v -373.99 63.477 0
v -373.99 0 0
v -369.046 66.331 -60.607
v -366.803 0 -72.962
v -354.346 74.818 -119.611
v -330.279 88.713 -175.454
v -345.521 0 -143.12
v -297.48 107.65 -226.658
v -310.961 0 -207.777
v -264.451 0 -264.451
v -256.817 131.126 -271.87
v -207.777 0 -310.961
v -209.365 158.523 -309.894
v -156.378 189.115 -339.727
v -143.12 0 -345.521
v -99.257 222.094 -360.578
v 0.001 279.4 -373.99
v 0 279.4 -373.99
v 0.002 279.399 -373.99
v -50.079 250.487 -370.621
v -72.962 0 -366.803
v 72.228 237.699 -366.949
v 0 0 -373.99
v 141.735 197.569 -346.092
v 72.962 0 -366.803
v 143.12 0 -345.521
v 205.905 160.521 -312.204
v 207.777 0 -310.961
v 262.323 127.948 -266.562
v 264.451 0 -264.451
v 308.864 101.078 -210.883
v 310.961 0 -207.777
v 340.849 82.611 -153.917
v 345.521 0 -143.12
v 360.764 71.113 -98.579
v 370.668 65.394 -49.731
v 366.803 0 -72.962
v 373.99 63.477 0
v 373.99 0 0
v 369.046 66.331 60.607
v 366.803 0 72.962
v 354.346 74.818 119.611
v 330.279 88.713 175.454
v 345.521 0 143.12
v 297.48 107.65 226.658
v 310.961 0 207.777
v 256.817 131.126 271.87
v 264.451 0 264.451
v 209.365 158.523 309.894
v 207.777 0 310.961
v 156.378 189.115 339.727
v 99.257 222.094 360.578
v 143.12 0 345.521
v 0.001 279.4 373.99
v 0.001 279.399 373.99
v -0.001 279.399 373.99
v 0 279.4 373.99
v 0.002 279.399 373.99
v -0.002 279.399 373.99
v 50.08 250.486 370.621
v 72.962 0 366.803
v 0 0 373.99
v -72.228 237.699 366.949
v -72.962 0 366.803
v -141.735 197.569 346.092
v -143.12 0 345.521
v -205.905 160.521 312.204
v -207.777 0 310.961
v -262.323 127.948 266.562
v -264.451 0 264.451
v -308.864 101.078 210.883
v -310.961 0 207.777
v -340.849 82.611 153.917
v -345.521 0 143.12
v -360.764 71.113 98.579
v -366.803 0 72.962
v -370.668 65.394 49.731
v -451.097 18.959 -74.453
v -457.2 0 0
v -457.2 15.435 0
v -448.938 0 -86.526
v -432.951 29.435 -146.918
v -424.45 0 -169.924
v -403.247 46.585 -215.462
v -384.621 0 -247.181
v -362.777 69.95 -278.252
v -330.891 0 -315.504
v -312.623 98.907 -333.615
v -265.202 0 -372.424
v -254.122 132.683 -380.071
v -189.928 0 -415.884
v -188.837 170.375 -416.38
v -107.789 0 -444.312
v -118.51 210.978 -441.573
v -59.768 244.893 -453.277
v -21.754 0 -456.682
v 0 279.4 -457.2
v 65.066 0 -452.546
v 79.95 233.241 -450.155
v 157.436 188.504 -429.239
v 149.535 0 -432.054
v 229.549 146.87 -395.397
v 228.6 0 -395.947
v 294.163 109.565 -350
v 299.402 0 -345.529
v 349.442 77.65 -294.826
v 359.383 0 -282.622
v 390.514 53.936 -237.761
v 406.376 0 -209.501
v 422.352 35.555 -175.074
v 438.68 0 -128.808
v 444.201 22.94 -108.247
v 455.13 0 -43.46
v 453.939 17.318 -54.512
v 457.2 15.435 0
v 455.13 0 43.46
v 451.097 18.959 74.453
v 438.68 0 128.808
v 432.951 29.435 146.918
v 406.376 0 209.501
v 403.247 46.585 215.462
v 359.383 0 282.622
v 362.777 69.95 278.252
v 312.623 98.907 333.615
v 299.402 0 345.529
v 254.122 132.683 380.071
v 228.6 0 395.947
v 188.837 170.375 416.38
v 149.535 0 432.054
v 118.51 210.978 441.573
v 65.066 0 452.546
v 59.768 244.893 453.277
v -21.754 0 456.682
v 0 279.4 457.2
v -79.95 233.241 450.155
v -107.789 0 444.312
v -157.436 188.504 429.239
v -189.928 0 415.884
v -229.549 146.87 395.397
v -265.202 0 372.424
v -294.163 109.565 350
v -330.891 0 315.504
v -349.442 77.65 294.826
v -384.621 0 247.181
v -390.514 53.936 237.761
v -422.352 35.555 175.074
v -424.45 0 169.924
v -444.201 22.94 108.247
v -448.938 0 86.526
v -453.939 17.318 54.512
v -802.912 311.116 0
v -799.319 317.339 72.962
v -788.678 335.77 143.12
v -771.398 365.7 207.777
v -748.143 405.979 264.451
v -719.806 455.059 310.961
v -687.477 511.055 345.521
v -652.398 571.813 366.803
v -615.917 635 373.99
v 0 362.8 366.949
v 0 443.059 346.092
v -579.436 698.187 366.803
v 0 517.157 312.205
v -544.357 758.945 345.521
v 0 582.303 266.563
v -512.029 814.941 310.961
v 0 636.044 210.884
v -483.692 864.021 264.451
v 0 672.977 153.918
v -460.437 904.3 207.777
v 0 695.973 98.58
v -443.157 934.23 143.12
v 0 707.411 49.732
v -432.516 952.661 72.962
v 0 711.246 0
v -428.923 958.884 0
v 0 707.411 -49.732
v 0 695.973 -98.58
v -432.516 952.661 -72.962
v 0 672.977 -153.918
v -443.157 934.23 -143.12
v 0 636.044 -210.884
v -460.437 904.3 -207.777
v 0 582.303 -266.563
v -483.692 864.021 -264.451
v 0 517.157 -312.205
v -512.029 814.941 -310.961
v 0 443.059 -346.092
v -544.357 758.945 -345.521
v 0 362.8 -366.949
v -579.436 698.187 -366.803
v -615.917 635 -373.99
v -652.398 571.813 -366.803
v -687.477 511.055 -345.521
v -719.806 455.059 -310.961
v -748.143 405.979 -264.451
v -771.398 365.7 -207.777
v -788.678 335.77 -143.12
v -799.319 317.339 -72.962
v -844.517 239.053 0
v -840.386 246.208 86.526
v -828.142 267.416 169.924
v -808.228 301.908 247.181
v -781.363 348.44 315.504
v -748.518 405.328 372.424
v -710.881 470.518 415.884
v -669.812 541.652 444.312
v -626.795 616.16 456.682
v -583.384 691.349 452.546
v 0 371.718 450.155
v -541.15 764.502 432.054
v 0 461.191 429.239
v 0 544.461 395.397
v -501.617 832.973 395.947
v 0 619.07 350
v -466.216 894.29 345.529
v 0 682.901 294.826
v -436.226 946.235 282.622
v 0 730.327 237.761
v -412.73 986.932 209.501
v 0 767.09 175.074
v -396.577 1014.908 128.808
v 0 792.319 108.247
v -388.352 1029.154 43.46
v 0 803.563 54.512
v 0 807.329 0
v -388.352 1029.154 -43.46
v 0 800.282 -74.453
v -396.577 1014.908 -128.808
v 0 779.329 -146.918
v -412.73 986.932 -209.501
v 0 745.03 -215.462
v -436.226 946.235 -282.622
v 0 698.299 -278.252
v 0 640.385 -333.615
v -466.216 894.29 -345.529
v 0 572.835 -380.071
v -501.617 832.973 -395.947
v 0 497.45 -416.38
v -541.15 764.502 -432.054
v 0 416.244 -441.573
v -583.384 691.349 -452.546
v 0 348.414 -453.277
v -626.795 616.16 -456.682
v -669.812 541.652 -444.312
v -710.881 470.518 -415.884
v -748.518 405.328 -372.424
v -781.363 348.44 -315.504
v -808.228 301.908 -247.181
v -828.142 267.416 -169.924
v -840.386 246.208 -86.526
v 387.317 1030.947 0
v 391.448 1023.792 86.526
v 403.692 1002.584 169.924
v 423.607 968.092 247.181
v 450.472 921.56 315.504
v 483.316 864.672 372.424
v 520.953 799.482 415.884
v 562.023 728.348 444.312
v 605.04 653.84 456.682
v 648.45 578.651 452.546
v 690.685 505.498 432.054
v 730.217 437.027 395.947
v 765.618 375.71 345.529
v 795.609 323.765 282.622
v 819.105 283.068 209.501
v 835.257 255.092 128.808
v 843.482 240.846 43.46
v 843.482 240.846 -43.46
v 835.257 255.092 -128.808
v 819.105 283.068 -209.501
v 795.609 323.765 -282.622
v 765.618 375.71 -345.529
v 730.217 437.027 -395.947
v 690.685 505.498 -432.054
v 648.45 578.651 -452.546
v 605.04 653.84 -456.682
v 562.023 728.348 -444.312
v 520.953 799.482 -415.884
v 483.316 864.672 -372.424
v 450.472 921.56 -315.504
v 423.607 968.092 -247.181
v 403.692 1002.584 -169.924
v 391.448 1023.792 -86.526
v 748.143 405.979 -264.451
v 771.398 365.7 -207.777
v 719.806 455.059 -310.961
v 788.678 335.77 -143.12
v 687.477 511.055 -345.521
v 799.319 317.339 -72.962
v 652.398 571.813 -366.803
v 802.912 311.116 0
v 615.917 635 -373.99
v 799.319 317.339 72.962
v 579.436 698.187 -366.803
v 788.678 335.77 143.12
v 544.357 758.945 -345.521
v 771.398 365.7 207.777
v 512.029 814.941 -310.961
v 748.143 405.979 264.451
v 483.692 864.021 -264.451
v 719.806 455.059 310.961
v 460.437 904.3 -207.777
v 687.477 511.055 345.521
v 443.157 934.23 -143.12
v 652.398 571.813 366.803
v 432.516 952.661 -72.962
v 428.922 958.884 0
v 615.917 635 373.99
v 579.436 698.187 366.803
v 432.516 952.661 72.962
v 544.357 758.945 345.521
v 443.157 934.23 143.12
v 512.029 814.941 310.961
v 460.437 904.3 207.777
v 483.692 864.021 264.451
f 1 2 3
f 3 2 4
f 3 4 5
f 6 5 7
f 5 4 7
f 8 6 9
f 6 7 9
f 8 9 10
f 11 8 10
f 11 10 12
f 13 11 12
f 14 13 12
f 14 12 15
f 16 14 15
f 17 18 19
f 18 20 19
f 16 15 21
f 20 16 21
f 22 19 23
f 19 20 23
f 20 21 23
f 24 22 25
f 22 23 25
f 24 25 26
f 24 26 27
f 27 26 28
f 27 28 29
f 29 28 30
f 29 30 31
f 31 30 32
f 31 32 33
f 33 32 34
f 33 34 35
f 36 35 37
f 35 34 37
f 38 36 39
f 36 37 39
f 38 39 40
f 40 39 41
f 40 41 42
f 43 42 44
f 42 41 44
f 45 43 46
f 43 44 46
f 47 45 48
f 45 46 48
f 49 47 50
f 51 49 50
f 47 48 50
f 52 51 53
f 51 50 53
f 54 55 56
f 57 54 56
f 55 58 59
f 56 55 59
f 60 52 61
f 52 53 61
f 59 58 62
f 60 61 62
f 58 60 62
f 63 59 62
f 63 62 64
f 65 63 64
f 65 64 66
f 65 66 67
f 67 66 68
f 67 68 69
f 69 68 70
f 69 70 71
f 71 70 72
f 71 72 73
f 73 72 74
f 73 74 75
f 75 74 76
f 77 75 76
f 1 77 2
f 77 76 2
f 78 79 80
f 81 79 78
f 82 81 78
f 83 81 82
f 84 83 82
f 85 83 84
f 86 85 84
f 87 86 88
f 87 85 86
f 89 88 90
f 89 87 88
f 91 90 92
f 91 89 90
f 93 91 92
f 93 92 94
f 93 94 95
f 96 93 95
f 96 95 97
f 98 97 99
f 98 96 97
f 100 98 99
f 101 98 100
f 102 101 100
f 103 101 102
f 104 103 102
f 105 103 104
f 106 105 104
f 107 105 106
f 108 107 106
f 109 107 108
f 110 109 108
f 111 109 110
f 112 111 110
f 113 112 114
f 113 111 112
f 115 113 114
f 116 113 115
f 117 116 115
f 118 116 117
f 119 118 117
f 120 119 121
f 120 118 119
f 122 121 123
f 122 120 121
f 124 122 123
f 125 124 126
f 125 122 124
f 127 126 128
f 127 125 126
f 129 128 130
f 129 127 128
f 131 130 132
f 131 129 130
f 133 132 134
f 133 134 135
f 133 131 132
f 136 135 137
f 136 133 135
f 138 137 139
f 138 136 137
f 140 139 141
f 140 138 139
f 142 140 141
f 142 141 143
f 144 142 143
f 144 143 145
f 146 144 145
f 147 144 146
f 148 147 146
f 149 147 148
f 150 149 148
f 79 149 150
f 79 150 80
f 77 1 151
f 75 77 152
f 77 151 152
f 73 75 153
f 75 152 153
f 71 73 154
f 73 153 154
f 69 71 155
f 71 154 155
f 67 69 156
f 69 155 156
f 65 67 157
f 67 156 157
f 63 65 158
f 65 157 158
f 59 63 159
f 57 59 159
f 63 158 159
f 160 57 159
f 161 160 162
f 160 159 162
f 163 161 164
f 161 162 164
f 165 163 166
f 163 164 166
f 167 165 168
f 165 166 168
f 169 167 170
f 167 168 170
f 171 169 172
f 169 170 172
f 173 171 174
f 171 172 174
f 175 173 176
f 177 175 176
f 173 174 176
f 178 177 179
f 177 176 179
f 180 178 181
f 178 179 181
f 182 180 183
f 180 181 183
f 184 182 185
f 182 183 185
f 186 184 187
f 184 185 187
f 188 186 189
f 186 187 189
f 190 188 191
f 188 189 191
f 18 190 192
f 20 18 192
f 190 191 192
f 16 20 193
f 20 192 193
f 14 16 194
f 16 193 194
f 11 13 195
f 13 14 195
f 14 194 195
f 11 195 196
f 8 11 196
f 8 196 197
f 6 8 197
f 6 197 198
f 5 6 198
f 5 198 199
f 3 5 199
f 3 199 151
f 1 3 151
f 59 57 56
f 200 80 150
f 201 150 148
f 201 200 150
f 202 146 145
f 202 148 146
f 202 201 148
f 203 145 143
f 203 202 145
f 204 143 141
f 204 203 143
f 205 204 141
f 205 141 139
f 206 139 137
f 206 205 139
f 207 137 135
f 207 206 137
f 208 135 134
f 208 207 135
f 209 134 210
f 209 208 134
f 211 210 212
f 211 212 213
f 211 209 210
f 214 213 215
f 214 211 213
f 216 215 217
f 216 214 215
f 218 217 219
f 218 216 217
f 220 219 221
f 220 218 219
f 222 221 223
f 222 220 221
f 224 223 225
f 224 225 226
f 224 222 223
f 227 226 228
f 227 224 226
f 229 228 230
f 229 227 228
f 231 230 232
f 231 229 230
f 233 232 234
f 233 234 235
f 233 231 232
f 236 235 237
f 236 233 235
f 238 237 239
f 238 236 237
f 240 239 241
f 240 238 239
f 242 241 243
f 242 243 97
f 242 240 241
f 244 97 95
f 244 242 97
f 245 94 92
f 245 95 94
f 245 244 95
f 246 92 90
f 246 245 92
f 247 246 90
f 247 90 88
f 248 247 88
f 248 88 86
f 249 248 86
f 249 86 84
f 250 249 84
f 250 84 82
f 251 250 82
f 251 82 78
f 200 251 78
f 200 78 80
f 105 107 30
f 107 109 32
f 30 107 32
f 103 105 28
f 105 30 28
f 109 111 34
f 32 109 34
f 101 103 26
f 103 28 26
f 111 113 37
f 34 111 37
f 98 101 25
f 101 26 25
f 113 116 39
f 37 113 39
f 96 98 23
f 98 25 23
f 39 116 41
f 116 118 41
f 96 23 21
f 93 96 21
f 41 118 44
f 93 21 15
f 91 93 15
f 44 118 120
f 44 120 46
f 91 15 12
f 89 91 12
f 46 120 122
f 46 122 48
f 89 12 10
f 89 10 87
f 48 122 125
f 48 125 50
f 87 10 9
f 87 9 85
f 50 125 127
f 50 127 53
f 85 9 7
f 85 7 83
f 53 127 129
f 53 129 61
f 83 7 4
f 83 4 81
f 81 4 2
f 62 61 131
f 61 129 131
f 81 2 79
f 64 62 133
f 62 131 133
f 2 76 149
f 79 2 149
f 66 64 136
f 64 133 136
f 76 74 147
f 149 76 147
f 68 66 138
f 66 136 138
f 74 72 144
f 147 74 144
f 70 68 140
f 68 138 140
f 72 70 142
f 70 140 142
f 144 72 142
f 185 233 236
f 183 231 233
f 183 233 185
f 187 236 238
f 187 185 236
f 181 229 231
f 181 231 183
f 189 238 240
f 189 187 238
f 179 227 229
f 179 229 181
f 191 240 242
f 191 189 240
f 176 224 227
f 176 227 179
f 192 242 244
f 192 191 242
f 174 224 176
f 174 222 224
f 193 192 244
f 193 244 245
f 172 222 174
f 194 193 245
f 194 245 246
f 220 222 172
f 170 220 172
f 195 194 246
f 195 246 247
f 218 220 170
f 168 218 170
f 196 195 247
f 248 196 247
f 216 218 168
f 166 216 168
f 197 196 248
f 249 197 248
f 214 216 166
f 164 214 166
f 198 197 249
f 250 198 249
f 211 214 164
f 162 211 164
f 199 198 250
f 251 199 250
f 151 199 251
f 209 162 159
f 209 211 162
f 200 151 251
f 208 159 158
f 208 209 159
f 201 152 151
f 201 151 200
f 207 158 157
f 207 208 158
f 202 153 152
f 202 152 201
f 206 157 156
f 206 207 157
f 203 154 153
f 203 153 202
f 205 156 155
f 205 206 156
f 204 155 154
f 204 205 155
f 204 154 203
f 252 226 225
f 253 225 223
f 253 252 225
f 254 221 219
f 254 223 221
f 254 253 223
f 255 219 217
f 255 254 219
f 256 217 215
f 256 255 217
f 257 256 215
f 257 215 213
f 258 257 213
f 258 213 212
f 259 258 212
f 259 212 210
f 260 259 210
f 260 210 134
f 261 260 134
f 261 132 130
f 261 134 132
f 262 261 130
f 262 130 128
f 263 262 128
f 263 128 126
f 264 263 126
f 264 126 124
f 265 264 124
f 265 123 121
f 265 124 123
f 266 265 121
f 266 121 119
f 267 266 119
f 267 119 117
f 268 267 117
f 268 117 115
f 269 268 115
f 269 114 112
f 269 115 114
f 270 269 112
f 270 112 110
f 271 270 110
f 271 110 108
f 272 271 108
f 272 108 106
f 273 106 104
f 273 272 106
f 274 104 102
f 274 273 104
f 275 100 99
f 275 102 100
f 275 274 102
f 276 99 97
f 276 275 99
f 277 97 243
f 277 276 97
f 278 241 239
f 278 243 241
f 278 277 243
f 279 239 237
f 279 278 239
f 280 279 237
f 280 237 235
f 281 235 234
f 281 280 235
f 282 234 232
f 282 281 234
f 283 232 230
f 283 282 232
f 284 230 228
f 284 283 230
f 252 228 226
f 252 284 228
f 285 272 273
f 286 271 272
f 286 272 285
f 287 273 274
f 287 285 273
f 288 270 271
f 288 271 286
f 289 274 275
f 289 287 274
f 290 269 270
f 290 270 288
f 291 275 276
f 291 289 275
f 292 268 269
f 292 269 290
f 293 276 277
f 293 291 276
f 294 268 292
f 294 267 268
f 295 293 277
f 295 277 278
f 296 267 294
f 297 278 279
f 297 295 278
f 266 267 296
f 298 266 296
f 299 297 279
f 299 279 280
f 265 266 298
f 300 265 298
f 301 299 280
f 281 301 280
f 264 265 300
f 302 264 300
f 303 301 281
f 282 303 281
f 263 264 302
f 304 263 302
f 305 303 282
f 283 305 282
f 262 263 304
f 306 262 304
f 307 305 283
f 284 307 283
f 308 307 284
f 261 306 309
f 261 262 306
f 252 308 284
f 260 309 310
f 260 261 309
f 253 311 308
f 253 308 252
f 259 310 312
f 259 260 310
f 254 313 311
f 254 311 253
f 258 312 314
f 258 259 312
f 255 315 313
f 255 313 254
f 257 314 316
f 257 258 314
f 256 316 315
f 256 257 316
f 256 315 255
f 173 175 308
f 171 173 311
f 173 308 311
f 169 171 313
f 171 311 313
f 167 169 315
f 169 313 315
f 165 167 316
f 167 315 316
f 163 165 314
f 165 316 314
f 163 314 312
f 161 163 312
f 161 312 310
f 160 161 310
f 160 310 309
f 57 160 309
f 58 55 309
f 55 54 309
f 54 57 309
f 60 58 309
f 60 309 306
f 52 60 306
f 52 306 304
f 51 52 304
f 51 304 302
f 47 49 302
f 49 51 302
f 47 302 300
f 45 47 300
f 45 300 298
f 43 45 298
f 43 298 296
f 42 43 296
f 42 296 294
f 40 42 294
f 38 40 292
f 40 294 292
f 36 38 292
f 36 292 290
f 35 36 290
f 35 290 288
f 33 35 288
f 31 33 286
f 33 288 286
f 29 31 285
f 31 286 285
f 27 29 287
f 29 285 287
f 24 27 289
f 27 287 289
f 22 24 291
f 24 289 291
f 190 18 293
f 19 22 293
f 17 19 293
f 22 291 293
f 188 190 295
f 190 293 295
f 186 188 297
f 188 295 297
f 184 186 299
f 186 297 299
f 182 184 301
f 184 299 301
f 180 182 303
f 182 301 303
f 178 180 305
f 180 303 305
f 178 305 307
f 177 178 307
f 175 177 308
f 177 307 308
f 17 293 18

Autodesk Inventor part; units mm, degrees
ref_plane "YZ Plane" through (0, 0, 0) normal (1, 0, 0) x (0, 1, 0)
sketch "Sketch1" plane through (0, 0, 0) normal (0, 0, 1) x (1, 0, 0)
  line L0 (0, 0) -> (0, 279.4)
  line L1 (0, 279.4) -> (615.9173, 635)
  line L2 (0, 279.4) -> (-615.9173, 635)
  line L3 (-615.9173, 635) -> (615.9173, 635) construction
  dimension "A_dimension" = 279.4
  dimension "angle" = 120
  dimension "B_dimension" = 711.2
sketch "Sketch2" plane through (0, 0, 0) normal (0, 1, 0) x (-1, 0, 0)
  circle A0 centre (0, 0) radius 457.2
  circle A1 centre (0, 0) radius 373.9896
  dimension "outerDiameter" = 914.4
  dimension "wallThickness" = 83.2104
ref_plane "Work Plane1" through (615.9173, 635, 0) normal (0.8660254, 0.5, 0) x (-0.5, 0.8660254, 0)
sketch "Sketch3" plane through (615.9173, 635, 0) normal (0.8660254, 0.5, 0) x (-0.5, 0.8660254, 0)
  circle A0 centre (0, 0) radius 457.2
  circle A1 centre (0, 0) radius 373.9896
  point P0 (-241.9675, 0)
  point P1 (0, 0)
  dimension "d7" = 914.4
  dimension "d8" = 83.2104
ref_plane "Work Plane2" through (-615.9173, 635, 0) normal (-0.8660254, 0.5, 0) x (-0.5, -0.8660254, 0)
sketch "Sketch4" plane through (-615.9173, 635, 0) normal (-0.8660254, 0.5, 0) x (-0.5, -0.8660254, 0)
  circle A0 centre (0, 0) radius 457.2
  circle A1 centre (0, 0) radius 373.9896
  point P0 (241.9675, 0)
  point P1 (0, 0)
  dimension "d9" = 914.4
  dimension "d11" = 83.2104
extrude "Extrusion1" add sketch "Sketch2" along normal up to surface (279.4 mm away)
extrude "Extrusion2" add sketch "Sketch4" against normal up to surface (711.2 mm away)
extrude "Extrusion3" add sketch "Sketch3" against normal up to surface (711.2 mm away)
extrude "Extrusion4" cut sketch "Sketch2" along normal up to surface (279.4 mm away) contours A1
extrude "Extrusion5" cut sketch "Sketch3" against normal up to surface (711.2 mm away) contours A1
extrude "Extrusion6" cut sketch "Sketch4" against normal up to surface (711.2 mm away) contours A1
extrude "Extrusion7" cut sketch "Sketch4" along normal through all contours A0 | A1
extrude "Extrusion8" cut sketch "Sketch3" along normal through all contours A0 | A1
extrude "Extrusion9" cut sketch "Sketch2" against normal through all contours A0 | A1
equation "\"d7\" = outerDiameter"
equation "\"d8\" = wallThickness"
equation "\"d9\" = outerDiameter"
equation "\"d11\" = wallThickness"
equation "\"nominalSize\" = 914.4"
properties part number "WYE-S36-SCH160-120"
